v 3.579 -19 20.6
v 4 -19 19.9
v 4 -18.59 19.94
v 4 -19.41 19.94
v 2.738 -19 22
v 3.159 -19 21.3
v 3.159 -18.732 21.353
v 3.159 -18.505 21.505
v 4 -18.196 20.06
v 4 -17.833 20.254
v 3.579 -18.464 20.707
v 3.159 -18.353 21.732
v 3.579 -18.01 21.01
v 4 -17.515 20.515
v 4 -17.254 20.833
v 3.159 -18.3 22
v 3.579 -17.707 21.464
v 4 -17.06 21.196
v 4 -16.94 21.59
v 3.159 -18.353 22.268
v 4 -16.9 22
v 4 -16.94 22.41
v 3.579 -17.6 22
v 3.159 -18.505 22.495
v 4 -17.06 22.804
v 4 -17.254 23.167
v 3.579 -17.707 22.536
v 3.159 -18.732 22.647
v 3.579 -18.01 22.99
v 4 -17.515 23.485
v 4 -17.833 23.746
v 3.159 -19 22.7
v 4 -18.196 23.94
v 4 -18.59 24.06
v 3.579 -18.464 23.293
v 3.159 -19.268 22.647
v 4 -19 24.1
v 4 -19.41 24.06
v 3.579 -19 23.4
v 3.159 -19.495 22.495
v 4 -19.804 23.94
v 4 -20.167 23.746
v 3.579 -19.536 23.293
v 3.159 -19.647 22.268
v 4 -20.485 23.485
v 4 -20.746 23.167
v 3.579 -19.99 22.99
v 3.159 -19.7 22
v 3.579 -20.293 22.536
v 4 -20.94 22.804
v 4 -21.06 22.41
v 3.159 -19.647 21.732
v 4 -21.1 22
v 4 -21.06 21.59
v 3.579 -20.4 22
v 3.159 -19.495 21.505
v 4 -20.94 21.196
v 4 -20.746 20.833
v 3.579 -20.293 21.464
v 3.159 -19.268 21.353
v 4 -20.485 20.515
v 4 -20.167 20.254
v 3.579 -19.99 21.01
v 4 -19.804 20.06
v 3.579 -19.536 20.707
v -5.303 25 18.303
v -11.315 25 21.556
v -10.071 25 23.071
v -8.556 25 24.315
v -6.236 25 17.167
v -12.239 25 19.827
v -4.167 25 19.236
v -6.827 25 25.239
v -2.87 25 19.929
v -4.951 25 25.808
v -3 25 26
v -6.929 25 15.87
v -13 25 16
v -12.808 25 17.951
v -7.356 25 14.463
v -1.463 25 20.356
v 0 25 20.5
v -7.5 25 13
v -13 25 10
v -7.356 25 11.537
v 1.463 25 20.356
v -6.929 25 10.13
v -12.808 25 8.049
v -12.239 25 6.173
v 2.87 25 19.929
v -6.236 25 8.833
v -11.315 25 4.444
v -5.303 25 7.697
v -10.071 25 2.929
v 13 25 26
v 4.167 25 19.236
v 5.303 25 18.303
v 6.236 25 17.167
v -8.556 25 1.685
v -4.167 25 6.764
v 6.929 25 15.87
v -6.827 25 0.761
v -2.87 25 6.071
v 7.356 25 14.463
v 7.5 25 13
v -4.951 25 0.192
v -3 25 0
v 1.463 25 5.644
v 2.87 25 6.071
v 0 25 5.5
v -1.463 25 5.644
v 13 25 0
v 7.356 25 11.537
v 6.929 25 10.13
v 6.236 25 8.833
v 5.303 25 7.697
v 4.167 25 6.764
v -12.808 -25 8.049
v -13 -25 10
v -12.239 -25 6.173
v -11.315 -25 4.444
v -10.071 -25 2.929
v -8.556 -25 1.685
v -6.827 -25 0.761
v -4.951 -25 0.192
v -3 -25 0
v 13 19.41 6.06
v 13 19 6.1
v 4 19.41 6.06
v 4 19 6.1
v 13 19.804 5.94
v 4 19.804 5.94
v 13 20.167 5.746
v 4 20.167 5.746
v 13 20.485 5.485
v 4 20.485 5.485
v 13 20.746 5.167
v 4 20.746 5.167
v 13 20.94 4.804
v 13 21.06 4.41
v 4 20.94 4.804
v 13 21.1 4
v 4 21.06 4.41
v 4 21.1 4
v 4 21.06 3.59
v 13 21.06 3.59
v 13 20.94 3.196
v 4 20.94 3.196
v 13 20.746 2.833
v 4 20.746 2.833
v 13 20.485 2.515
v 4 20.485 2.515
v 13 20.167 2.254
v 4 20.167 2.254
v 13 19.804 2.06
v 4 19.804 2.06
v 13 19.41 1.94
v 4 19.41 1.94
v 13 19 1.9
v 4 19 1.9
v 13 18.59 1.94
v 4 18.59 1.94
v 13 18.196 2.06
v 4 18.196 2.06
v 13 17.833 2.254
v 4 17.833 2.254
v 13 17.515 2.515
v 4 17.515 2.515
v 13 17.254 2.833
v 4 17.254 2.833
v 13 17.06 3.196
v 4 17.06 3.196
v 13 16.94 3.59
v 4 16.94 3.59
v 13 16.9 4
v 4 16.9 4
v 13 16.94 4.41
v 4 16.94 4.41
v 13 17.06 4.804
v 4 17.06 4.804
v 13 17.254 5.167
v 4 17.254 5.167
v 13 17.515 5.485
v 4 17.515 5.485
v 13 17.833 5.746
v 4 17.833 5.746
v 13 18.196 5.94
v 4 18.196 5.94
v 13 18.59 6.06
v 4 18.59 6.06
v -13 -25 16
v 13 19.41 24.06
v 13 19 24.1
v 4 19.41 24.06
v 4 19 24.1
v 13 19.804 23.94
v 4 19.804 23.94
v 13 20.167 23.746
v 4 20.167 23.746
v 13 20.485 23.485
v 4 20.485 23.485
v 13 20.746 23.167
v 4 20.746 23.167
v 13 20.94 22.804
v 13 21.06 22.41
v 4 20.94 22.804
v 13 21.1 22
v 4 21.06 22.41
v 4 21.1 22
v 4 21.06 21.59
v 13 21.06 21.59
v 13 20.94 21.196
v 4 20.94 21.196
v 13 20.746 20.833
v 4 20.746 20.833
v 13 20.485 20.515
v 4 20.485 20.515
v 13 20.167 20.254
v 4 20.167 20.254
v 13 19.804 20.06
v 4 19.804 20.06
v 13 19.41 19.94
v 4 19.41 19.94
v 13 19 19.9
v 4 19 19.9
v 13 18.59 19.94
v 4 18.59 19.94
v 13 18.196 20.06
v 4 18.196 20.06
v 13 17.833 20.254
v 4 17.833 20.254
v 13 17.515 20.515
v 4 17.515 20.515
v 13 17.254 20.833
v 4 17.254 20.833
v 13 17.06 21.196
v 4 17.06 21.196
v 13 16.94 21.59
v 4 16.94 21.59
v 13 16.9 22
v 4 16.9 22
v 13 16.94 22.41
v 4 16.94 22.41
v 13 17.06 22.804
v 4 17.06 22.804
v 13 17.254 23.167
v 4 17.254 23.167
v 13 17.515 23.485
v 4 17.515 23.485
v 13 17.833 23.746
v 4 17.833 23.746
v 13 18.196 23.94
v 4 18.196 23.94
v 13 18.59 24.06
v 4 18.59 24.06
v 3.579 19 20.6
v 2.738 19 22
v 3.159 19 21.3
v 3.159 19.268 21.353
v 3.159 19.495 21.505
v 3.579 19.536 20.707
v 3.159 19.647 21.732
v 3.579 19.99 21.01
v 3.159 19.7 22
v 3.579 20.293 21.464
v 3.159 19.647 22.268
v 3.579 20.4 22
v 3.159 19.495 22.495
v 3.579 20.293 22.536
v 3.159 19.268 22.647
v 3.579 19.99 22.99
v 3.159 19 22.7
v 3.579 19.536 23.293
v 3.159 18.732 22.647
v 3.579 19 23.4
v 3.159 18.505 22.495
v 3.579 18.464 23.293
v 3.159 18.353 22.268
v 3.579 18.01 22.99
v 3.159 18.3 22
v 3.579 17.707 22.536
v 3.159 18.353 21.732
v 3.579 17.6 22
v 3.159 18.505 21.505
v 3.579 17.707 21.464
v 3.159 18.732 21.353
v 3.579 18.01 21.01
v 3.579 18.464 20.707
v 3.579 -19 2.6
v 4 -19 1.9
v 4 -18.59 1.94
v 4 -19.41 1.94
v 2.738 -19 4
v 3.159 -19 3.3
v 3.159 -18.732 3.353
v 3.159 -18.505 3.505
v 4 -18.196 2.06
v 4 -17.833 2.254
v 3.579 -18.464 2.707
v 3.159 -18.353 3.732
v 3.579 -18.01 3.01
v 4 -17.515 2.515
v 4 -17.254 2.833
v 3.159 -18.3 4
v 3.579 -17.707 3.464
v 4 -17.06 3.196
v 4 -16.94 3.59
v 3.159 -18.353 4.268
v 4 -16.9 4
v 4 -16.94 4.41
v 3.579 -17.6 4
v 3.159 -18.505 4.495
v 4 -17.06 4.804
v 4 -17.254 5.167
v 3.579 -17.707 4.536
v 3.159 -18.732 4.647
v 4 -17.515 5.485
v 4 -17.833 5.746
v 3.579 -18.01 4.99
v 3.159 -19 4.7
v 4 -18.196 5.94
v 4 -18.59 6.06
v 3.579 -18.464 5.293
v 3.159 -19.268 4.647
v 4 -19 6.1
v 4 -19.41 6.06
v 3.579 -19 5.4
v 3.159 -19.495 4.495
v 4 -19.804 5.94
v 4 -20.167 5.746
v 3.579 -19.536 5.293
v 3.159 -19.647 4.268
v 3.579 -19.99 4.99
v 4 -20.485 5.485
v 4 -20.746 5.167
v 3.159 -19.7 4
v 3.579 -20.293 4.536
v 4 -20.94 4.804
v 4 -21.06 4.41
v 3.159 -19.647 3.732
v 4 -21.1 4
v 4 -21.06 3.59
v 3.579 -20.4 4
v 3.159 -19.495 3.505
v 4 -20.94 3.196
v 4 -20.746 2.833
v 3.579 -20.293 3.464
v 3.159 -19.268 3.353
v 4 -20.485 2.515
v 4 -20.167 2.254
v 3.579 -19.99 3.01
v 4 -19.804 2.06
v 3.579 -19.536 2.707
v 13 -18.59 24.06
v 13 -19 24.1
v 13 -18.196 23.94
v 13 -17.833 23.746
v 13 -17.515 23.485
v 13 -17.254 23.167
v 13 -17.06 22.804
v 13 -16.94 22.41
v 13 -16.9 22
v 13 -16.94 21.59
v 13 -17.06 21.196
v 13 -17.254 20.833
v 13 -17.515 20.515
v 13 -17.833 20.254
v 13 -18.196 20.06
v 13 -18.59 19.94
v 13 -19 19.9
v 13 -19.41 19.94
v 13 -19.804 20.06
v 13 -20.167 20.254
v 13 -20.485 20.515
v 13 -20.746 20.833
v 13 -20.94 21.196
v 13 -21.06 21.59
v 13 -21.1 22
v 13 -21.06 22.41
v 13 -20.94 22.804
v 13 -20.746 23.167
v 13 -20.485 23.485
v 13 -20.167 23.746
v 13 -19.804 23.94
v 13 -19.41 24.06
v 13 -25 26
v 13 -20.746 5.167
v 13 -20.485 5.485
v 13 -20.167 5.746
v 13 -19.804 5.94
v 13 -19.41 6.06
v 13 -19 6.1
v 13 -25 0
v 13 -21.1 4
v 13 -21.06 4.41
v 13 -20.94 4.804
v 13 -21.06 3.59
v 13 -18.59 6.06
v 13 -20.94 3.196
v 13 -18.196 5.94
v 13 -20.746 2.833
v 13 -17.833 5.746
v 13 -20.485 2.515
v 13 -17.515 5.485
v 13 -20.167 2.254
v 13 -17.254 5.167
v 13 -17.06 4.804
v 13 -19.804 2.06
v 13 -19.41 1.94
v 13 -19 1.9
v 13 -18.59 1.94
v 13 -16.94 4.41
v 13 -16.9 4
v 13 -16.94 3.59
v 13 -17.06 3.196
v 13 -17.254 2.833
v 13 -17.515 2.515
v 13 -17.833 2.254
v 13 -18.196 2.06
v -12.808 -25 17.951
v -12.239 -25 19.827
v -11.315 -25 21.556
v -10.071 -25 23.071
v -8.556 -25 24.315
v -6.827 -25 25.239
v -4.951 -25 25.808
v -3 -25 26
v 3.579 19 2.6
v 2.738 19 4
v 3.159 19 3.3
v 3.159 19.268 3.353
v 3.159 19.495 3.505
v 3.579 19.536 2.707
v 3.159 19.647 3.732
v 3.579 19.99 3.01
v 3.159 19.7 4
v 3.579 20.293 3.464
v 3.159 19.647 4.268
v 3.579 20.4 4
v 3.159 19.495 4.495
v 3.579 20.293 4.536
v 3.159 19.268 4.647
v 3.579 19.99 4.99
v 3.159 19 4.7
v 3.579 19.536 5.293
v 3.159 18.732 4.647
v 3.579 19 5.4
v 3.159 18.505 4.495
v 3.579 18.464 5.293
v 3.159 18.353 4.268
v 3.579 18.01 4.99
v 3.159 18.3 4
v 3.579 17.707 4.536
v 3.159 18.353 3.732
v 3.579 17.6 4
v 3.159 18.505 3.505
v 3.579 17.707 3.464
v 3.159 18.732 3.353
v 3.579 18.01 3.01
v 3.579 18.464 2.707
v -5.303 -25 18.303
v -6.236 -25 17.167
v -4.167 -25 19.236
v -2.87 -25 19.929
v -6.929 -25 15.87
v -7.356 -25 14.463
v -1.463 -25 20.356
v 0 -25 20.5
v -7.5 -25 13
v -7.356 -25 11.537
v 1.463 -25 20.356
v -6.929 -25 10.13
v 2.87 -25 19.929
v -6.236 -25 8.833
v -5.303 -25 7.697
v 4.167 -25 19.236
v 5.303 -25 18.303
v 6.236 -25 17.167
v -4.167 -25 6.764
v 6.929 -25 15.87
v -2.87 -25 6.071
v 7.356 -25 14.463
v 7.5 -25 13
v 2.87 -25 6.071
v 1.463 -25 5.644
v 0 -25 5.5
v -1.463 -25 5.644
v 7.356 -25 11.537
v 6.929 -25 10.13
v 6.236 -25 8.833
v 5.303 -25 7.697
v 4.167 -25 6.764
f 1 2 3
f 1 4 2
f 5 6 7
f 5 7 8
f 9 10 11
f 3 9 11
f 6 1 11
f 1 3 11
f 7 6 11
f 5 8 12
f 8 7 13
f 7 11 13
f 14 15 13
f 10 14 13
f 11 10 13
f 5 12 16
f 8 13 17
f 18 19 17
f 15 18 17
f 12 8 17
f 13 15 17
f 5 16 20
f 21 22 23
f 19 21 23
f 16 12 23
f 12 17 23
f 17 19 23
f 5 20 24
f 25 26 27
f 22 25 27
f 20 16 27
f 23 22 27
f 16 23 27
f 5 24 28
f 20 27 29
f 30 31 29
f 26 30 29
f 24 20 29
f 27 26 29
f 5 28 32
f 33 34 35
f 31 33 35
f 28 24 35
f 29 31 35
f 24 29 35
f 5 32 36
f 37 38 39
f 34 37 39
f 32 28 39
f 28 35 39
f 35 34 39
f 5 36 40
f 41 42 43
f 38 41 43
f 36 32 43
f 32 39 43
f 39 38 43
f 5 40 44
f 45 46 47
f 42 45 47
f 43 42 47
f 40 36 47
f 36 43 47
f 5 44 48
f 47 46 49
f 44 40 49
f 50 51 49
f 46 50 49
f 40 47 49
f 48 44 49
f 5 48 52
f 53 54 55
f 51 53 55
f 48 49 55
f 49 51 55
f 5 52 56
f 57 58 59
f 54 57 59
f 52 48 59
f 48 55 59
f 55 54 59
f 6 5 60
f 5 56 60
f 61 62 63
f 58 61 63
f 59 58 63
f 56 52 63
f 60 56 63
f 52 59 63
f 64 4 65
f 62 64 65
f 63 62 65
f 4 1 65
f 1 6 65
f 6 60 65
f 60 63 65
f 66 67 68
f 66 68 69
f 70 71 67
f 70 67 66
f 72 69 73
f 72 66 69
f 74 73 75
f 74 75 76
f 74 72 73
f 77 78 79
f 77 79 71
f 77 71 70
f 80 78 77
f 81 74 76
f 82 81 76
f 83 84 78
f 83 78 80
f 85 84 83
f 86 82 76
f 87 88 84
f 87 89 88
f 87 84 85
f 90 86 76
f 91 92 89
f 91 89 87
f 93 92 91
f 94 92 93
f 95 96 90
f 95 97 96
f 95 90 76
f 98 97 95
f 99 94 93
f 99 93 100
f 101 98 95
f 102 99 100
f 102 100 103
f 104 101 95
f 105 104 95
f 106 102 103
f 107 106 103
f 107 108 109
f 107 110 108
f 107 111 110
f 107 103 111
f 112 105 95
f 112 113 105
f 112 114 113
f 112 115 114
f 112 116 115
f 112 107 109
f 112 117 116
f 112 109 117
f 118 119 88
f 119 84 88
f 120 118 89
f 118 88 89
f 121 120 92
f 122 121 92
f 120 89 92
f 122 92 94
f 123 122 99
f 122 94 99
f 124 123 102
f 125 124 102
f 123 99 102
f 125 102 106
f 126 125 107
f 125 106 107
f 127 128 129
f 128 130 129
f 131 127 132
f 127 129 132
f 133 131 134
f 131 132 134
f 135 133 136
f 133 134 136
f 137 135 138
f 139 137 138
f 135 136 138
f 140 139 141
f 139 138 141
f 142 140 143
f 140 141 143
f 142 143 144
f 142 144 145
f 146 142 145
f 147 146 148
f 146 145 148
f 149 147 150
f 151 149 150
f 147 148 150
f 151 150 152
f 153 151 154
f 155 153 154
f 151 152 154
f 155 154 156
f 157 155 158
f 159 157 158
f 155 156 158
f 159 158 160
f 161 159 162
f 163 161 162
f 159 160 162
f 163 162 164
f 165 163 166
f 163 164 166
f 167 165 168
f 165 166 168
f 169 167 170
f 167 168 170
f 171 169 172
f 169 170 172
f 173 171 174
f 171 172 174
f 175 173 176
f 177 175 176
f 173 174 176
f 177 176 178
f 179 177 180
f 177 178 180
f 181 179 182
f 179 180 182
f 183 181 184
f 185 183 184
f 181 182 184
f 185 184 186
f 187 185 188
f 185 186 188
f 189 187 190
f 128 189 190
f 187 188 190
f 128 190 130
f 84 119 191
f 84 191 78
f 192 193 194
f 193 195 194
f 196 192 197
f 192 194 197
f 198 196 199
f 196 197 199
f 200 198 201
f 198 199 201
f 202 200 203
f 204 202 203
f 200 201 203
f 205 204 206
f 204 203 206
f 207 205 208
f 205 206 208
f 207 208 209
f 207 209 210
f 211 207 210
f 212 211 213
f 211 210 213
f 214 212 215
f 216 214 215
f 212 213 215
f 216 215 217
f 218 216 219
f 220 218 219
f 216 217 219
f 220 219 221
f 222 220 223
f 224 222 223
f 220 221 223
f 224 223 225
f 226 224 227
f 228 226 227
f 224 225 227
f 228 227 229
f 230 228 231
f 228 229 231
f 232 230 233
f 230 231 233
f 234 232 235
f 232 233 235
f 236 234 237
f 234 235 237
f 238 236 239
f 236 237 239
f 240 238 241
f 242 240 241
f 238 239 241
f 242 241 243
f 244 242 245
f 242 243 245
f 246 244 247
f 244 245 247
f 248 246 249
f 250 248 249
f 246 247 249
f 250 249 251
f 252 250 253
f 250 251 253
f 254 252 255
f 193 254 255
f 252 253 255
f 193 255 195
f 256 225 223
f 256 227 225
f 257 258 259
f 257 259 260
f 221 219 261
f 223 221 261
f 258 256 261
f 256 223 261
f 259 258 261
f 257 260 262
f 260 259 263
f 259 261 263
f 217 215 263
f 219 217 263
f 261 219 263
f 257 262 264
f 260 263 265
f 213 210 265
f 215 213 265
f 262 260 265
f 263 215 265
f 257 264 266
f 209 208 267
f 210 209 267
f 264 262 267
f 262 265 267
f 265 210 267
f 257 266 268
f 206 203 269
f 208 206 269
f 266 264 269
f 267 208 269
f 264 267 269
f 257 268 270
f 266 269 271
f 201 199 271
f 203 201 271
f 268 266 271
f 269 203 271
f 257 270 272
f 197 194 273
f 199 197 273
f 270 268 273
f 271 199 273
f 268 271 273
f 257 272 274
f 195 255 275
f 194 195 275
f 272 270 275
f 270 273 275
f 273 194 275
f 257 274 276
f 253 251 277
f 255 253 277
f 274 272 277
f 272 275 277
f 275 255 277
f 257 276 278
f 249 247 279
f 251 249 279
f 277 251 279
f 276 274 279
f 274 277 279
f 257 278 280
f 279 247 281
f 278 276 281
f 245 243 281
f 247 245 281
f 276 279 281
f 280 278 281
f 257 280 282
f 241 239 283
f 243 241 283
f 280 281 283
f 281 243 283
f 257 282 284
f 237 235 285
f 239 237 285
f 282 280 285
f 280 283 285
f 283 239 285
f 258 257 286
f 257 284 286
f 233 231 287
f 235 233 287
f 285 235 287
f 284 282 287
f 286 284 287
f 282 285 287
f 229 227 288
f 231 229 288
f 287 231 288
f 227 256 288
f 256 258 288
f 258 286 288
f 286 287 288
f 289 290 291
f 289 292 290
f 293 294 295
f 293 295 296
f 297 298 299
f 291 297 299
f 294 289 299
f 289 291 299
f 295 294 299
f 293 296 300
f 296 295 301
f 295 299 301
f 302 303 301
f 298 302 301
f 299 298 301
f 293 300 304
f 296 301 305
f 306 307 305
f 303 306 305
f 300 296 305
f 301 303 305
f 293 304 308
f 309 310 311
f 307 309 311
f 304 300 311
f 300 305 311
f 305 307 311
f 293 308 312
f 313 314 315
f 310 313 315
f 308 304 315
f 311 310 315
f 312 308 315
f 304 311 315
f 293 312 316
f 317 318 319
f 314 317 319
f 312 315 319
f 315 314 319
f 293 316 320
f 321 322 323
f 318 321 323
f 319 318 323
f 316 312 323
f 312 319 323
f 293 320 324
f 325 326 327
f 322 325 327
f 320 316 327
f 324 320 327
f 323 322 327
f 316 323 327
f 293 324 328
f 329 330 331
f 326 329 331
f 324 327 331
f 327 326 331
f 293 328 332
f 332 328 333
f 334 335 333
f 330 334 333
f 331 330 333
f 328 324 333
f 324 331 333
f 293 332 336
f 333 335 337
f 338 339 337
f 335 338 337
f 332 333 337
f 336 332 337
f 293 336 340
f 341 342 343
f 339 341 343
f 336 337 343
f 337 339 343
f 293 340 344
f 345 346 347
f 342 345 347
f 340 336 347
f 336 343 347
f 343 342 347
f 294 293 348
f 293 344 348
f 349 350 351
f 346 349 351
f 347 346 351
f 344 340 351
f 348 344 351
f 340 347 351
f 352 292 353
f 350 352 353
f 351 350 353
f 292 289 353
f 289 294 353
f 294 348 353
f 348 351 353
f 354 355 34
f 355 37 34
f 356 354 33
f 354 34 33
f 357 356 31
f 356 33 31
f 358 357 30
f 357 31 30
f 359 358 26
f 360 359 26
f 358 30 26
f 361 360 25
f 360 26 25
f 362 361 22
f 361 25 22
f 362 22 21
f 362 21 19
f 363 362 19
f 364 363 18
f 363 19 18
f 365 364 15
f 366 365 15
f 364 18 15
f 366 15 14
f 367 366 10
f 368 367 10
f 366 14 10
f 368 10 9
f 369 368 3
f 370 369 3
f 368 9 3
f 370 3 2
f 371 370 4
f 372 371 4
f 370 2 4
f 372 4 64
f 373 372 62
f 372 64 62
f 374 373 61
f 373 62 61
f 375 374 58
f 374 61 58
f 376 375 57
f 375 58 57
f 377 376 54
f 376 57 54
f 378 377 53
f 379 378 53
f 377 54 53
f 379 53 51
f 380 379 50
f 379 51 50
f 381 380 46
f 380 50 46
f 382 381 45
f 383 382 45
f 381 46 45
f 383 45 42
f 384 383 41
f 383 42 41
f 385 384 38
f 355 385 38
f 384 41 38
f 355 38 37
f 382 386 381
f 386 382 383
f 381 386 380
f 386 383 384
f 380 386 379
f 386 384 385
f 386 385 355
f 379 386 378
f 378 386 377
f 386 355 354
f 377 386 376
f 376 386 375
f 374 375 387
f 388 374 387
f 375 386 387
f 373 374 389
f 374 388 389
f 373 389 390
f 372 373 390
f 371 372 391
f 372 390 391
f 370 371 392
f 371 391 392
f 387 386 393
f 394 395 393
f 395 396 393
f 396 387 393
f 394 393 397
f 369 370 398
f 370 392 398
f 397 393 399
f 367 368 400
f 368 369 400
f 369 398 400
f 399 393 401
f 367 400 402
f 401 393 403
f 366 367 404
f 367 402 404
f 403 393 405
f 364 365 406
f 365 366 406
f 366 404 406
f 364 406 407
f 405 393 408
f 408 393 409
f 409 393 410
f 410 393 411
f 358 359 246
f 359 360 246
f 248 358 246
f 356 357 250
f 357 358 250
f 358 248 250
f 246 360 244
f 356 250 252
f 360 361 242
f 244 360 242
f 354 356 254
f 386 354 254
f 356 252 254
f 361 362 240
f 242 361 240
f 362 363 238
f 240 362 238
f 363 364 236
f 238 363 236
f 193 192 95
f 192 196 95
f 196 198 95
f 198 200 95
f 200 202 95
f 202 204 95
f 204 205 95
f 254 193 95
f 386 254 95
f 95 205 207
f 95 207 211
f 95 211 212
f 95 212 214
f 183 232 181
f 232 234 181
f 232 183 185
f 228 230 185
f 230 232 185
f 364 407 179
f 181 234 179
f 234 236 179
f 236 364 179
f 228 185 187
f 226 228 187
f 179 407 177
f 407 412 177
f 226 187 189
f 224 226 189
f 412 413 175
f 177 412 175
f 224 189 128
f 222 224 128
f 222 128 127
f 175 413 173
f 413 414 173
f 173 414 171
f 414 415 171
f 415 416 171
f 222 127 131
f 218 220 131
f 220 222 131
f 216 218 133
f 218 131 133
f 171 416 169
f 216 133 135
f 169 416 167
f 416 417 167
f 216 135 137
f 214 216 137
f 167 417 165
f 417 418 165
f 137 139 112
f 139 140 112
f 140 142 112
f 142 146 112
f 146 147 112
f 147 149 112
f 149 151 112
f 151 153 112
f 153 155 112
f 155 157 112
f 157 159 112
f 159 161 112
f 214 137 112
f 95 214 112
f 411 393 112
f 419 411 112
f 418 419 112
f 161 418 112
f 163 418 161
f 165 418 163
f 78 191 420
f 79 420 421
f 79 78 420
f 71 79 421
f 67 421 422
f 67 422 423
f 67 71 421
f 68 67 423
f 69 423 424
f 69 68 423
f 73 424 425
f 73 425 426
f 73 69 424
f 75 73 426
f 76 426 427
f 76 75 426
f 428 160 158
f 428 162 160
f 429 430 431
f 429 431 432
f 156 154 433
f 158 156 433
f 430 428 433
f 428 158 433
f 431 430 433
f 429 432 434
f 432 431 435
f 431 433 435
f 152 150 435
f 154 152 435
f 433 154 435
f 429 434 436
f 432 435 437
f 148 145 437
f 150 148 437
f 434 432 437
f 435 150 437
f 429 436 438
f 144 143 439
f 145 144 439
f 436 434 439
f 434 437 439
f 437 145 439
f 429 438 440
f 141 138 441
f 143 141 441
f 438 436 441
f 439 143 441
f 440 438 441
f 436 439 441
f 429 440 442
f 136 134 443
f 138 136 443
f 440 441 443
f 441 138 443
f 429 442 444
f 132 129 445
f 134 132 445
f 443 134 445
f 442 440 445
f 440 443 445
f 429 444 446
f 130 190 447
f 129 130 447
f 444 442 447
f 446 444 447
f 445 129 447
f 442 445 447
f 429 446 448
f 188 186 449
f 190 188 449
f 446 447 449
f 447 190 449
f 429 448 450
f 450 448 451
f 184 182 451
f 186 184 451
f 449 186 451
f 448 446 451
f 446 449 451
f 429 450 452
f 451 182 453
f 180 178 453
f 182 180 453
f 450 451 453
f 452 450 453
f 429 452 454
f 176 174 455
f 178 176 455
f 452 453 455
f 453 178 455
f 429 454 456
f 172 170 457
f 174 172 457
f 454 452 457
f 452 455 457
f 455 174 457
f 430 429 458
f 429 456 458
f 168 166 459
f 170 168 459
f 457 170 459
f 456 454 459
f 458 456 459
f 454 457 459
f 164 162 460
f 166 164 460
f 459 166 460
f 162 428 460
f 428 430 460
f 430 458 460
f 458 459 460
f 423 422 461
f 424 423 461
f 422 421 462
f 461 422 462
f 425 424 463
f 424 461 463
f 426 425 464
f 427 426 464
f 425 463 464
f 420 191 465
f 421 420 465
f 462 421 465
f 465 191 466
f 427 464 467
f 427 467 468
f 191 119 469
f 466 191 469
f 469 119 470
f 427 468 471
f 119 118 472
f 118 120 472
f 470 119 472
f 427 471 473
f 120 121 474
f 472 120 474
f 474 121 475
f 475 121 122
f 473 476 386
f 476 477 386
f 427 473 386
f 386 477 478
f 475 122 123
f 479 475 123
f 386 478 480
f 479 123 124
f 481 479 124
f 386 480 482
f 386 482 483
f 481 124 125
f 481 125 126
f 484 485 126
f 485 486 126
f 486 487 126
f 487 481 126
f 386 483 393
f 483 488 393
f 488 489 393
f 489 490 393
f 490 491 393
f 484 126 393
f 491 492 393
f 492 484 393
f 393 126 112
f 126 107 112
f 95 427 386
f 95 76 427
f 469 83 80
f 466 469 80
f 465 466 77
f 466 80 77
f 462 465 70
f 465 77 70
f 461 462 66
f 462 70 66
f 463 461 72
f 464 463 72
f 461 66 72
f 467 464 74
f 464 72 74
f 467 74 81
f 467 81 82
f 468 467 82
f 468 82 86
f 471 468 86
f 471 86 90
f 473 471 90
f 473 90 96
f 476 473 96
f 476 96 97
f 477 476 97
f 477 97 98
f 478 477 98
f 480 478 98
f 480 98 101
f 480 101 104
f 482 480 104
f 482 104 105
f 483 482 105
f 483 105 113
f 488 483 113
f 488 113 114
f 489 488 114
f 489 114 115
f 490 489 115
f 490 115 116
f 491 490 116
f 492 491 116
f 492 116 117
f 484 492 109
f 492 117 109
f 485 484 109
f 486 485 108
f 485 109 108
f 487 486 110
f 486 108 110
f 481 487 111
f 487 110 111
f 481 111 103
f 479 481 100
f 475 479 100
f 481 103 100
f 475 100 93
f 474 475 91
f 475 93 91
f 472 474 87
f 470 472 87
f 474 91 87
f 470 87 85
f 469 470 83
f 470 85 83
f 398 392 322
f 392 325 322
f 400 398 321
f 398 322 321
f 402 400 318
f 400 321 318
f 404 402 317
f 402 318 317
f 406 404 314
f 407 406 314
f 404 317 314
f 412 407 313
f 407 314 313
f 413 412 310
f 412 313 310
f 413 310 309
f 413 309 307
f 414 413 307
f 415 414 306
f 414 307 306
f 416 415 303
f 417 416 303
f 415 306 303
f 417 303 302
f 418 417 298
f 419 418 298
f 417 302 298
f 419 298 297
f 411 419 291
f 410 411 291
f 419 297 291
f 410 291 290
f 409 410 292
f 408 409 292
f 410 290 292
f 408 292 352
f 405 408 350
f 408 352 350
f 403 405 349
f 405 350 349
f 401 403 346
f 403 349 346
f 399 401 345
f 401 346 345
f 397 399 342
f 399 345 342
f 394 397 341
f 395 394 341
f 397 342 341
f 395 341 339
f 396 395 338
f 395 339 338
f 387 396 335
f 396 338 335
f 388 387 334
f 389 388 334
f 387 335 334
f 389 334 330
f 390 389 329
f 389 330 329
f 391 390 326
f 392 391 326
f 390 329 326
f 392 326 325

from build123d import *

# Parameters (mm, degrees)
SKIZZE1_W                       = 26
SKIZZE1_H                       = 50
AUFSATZ_LINEAR_AUSTRAGEN1_DEPTH = 26
VERRUNDUNG1_R                   = 10
SKIZZE2_R                       = 7.5
SCHNITT_LINEAR_AUSTRAGEN1_DEPTH = 58.835974964
M5_GEWINDEBOHRUNG1_D            = 4.2
M5_GEWINDEBOHRUNG1_DEPTH        = 9
M5_GEWINDEBOHRUNG1_TIP          = 1.2618073


with BuildPart() as part:
    # Skizze1 → Aufsatz-Linear austragen1 (new body)
    with BuildSketch(Plane.XY):
        Rectangle(SKIZZE1_W, SKIZZE1_H)
    extrude(amount=AUFSATZ_LINEAR_AUSTRAGEN1_DEPTH)

    # Verrundung1
    verrundung1_edges = [part.edges().sort_by_distance(p)[0] for p in [
        (-13, 0, 26),
        (-13, 0, 0),
    ]]
    fillet(verrundung1_edges, radius=VERRUNDUNG1_R)

    # Skizze2 → Schnitt-Linear austragen1 (cut, through all)
    with BuildSketch(Plane(origin=(0, 25, 0), x_dir=(1, 0, 0), z_dir=(0, 1, 0))):
        with Locations(Location((0, -13, 0), (0, 0, 180))):
            Circle(SKIZZE2_R)
    extrude(amount=-SCHNITT_LINEAR_AUSTRAGEN1_DEPTH, mode=Mode.SUBTRACT)

    # M5 Gewindebohrung1
    with Locations(Plane(origin=(13, 0, 0), x_dir=(0, 0, -1), z_dir=(1, 0, 0))):
        with Locations((-22, 19), (-4, 19), (-22, -19), (-4, -19)):
            Hole(M5_GEWINDEBOHRUNG1_D / 2, depth=M5_GEWINDEBOHRUNG1_DEPTH)
            with Locations((0, 0, -(M5_GEWINDEBOHRUNG1_DEPTH + M5_GEWINDEBOHRUNG1_TIP / 2))):  # 118° drill point
                Cone(0, M5_GEWINDEBOHRUNG1_D / 2, M5_GEWINDEBOHRUNG1_TIP, mode=Mode.SUBTRACT)


solid = part.part
